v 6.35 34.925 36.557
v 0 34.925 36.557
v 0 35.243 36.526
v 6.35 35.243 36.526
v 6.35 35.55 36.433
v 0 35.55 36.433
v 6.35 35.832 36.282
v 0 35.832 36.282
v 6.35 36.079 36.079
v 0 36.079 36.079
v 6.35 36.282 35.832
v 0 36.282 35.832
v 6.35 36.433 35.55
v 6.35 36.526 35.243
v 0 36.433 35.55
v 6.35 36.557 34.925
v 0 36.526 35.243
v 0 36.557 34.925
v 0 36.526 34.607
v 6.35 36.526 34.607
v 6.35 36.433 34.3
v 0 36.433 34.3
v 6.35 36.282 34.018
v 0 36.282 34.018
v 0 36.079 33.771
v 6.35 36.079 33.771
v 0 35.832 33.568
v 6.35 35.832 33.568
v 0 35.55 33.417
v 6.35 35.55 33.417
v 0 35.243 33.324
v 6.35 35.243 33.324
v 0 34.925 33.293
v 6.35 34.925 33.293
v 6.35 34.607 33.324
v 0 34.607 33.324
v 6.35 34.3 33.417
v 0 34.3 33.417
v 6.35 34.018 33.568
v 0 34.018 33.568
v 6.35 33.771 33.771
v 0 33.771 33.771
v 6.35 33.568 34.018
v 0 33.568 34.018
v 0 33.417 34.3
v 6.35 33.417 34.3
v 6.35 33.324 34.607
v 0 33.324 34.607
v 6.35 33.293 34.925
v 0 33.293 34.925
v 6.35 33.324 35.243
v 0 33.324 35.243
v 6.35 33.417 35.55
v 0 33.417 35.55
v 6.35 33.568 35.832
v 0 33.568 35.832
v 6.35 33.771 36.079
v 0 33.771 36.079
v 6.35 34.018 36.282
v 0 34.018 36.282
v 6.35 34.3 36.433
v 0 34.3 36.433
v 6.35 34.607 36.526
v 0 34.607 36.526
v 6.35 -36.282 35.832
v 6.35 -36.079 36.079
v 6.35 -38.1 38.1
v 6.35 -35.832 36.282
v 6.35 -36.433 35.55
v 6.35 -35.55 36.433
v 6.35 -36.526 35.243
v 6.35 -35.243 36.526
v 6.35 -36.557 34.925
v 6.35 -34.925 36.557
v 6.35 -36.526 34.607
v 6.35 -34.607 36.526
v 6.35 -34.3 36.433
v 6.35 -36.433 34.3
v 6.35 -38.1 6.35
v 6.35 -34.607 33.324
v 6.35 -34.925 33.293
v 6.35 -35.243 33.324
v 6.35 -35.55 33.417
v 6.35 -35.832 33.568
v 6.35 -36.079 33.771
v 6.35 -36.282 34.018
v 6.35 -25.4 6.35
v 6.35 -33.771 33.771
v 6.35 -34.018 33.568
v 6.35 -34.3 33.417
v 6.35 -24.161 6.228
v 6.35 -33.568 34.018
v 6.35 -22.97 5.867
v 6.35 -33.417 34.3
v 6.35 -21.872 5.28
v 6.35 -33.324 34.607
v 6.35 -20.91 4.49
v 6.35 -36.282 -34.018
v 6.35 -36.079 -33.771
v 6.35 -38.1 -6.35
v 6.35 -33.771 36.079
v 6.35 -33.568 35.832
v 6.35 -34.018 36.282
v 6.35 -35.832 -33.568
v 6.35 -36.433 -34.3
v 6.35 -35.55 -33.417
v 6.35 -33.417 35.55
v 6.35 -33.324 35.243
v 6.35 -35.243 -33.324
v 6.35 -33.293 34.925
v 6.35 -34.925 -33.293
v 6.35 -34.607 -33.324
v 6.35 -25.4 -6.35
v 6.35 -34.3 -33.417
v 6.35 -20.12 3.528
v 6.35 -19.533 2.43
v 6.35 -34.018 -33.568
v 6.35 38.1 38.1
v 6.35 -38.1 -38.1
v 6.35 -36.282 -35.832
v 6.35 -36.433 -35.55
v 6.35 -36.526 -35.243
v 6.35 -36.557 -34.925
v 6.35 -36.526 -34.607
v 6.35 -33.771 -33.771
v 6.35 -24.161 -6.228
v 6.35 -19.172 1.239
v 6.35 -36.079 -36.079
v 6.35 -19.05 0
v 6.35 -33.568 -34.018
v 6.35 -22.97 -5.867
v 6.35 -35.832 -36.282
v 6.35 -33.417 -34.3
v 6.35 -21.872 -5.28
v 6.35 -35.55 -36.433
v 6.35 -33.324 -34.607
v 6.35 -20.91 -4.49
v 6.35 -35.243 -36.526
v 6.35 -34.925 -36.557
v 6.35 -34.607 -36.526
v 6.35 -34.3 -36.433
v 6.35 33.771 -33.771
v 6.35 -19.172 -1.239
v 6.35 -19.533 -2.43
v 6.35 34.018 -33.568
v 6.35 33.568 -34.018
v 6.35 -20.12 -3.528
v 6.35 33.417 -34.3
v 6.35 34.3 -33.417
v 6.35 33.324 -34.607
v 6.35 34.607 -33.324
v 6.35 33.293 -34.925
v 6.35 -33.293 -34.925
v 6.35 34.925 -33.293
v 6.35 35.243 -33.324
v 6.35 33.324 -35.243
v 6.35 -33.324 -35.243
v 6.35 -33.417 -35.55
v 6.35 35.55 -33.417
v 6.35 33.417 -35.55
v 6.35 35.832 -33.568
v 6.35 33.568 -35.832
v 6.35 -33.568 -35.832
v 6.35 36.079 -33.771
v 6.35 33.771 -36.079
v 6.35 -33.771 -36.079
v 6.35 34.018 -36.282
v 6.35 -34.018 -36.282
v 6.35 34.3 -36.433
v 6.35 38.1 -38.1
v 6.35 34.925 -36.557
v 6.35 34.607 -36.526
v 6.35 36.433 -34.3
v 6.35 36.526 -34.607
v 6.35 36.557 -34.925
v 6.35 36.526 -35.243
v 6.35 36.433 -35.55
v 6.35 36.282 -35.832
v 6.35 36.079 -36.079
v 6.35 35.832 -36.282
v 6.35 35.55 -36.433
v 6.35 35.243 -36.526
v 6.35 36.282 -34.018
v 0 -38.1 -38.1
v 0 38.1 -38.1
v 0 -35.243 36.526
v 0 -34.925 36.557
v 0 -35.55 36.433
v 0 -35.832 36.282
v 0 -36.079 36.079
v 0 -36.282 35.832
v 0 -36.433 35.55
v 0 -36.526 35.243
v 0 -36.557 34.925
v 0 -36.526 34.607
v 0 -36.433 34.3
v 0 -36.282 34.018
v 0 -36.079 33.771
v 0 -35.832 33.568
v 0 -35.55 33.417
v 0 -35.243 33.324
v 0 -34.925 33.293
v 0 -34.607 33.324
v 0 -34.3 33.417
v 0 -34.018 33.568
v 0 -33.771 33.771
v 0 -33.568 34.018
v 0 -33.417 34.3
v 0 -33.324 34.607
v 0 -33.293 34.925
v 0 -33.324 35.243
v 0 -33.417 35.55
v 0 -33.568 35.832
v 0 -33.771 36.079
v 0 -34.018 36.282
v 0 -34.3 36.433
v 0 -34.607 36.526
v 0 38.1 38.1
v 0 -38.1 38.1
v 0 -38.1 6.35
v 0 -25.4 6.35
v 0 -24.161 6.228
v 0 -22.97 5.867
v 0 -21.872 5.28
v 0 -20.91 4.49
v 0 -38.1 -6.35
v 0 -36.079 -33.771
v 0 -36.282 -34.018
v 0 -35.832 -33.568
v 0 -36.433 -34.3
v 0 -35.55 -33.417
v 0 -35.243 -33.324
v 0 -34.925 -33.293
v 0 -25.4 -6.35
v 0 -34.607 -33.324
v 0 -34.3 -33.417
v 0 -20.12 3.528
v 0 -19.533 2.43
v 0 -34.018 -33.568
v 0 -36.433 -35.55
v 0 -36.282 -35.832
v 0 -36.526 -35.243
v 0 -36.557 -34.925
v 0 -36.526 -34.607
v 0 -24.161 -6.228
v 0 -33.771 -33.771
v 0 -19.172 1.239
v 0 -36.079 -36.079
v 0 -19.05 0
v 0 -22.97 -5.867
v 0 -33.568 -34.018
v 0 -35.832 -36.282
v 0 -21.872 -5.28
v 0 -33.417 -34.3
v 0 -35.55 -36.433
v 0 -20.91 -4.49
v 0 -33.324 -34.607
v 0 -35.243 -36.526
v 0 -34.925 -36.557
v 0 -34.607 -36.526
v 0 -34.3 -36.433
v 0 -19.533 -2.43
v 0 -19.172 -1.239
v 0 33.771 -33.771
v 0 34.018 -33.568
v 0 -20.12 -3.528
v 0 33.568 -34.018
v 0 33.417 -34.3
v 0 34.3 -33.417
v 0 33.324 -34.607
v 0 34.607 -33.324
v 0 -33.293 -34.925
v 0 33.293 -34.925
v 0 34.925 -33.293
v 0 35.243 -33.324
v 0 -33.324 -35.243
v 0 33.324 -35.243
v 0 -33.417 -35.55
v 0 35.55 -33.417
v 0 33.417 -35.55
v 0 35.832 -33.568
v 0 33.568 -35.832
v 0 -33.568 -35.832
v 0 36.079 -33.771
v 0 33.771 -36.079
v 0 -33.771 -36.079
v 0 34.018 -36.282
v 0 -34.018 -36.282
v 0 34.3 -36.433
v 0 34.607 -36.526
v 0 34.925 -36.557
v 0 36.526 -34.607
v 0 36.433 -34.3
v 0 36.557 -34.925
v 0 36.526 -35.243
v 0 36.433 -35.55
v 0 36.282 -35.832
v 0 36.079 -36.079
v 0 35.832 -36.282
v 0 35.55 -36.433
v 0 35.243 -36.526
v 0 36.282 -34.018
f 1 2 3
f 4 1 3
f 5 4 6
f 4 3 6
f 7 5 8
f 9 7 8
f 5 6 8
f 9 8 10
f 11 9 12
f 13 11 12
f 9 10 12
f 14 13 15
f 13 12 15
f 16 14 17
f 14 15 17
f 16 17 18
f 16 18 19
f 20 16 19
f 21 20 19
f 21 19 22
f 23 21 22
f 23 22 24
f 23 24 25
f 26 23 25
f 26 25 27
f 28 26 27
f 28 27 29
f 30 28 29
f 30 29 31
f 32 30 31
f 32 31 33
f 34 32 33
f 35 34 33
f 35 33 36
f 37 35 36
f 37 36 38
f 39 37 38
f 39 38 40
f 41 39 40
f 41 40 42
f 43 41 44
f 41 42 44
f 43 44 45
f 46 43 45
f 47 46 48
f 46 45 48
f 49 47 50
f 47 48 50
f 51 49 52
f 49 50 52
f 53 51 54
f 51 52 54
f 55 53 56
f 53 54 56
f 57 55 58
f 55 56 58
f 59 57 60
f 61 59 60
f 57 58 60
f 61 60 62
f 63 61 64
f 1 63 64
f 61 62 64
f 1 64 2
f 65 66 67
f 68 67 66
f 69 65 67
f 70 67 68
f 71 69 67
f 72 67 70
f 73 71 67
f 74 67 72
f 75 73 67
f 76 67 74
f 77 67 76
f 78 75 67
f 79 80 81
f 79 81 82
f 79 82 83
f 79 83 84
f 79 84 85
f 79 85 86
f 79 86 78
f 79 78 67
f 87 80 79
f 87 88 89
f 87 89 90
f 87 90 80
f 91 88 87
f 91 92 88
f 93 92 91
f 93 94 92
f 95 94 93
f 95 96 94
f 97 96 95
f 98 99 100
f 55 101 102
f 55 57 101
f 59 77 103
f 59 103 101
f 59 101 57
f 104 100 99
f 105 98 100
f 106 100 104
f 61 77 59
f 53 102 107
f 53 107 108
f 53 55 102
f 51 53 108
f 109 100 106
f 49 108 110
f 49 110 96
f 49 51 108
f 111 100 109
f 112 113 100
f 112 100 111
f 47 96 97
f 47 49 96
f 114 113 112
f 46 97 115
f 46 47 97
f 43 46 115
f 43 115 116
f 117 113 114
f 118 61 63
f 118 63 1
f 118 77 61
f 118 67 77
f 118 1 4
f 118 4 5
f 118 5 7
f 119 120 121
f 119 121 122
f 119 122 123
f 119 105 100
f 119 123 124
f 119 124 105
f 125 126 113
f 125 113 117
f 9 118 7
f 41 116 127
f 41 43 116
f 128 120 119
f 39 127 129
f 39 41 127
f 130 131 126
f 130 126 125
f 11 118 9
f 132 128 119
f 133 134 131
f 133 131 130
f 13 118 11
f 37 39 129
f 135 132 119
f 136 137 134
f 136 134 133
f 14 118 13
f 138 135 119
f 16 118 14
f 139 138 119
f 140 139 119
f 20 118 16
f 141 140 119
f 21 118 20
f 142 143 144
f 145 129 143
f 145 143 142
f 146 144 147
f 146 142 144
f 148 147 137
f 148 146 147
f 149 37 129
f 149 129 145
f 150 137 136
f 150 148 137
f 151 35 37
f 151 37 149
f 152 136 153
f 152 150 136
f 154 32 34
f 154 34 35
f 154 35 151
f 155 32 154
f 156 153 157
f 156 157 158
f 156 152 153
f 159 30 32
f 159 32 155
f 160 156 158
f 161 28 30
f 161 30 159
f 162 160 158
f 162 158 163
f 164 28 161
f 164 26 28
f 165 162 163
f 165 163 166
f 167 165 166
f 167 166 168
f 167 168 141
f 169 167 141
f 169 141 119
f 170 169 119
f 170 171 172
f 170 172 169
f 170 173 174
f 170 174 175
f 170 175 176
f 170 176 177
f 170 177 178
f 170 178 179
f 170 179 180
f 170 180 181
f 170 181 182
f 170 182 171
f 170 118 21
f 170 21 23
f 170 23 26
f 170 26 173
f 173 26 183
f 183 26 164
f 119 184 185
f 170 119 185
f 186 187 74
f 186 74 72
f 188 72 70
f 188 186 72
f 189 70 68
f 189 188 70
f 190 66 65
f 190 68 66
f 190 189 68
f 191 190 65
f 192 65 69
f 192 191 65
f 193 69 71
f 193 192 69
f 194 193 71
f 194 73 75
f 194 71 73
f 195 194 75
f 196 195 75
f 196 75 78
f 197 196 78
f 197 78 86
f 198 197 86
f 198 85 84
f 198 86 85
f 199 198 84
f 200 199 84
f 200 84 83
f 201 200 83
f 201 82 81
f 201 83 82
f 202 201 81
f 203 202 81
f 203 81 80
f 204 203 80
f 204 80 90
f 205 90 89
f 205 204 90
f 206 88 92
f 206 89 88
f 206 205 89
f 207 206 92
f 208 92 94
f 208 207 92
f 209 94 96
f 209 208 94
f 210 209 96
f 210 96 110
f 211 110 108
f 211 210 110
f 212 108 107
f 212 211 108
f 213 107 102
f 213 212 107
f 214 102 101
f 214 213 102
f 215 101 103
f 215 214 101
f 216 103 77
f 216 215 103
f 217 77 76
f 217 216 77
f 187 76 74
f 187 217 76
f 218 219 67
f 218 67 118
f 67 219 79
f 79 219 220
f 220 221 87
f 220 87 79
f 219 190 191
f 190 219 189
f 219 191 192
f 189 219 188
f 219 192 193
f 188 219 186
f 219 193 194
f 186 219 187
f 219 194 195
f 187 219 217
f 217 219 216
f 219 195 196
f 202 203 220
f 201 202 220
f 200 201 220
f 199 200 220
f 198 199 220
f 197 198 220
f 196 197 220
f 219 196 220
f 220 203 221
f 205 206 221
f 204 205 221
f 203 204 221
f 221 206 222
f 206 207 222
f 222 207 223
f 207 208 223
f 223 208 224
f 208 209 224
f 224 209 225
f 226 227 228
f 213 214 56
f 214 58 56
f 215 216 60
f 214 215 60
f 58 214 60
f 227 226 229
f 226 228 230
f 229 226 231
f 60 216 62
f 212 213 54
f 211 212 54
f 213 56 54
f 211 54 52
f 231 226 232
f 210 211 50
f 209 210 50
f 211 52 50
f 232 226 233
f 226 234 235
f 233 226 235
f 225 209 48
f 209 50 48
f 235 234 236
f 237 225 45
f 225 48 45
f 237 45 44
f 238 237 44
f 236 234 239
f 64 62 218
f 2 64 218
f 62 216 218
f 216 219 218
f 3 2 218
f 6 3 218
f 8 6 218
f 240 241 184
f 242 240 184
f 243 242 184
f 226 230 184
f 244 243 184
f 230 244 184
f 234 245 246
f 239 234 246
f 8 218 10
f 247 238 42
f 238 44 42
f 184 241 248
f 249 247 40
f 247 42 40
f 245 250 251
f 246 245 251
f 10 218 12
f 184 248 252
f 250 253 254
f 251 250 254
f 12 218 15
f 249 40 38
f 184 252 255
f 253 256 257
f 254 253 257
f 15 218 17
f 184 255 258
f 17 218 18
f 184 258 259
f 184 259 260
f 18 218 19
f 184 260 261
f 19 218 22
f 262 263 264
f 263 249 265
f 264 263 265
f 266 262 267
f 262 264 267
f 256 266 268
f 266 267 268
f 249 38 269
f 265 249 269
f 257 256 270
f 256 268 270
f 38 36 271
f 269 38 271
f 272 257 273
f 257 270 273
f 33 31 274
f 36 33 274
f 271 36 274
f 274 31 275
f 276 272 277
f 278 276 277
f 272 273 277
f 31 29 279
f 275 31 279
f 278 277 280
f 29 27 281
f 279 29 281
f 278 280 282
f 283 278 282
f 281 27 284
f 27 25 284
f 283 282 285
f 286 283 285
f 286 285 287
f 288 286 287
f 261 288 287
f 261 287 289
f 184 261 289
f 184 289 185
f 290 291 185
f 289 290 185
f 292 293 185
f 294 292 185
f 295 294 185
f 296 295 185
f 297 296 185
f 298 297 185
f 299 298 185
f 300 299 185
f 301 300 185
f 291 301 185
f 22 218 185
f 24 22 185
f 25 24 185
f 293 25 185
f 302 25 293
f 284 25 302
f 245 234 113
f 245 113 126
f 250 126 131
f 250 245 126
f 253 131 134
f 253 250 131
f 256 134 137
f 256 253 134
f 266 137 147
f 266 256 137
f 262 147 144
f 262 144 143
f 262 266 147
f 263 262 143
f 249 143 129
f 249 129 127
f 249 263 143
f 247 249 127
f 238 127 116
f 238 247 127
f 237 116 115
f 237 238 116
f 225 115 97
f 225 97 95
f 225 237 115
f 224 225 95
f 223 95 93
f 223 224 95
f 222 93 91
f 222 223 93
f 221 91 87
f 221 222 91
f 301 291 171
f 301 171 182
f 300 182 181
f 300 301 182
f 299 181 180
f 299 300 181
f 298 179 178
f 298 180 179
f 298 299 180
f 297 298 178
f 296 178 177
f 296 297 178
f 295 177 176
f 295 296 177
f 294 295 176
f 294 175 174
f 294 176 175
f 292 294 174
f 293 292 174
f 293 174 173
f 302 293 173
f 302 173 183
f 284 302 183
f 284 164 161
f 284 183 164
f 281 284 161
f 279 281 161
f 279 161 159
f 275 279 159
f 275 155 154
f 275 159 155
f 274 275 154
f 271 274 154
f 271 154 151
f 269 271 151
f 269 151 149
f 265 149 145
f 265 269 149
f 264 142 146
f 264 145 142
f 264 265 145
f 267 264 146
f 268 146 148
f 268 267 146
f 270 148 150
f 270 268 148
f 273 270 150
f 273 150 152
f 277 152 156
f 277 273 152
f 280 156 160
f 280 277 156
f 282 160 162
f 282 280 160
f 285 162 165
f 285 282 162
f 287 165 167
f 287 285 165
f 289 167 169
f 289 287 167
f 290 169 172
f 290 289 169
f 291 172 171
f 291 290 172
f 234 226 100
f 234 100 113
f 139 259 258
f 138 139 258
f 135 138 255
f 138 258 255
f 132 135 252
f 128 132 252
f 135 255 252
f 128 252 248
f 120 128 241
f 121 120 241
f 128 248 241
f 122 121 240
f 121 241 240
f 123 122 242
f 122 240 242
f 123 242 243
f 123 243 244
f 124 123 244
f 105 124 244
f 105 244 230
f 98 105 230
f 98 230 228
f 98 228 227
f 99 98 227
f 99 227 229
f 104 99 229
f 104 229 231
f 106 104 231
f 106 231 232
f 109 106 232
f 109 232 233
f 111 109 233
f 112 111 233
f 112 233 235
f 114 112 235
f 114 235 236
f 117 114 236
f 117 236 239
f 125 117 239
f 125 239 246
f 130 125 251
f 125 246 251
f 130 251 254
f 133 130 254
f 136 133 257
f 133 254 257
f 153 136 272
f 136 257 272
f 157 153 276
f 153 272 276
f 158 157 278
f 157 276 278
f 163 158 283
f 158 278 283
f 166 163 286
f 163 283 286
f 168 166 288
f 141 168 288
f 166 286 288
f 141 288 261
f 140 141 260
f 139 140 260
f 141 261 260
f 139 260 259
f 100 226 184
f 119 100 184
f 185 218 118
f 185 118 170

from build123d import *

# Parameters (mm, degrees)
SKETCH1_W                      = 76.2
SKETCH1_H                      = 76.2
BOSS_EXTRUDE1_DEPTH            = 6.35
F_4_CLEARANCE_HOLE1_D          = 3.2639
MIRROR2_COPY_1_D               = 3.2639
F_1_2_0_5_DIAMETER_SLOT1_DEPTH = 6.35


# Read off the part's stored shape, not the designer's step: 1/2 (0.5) Diameter Slot1
with BuildPart() as part:
    # Sketch1 → Boss-Extrude1 (new body)
    with BuildSketch(Plane(origin=(0, 0, 0), x_dir=(0, 0, -1), z_dir=(1, 0, 0))):
        Rectangle(SKETCH1_W, SKETCH1_H)
    extrude(amount=BOSS_EXTRUDE1_DEPTH)

    # #4 Clearance Hole1 (through all)
    with Locations(Plane(origin=(6.35, 0, 0), x_dir=(0, 0, -1), z_dir=(1, 0, 0))):
        with Locations((-34.925, 34.925)):
            f_4_clearance_hole1 = Hole(F_4_CLEARANCE_HOLE1_D / 2)

    # Mirror1: #4 Clearance Hole1 across plane
    add(f_4_clearance_hole1.mirror(Plane.XY), mode=Mode.SUBTRACT)

    # Mirror2: #4 Clearance Hole1 across plane
    add(f_4_clearance_hole1.mirror(Plane.ZX), mode=Mode.SUBTRACT)

    # Mirror2 copy 1 (through all)
    with Locations(Plane(origin=(6.35, 0, 0), x_dir=(0, 0, 1), z_dir=(1, 0, 0))):
        with Locations((-34.925, 34.925)):
            Hole(MIRROR2_COPY_1_D / 2)

    # 1/2 (0.5) Diameter Slot1 outline → 1/2 (0.5) Diameter Slot1 (cut)
    with BuildSketch(Plane.YZ):
        with BuildLine():
            ThreePointArc((-25.4, -6.35), (-19.05, 0), (-25.4, 6.35))
            Line((-25.4, 6.35), (-38.1, 6.35))
            Line((-38.1, 6.35), (-38.1, -6.35))
            Line((-38.1, -6.35), (-25.4, -6.35))
        make_face()
    extrude(amount=F_1_2_0_5_DIAMETER_SLOT1_DEPTH, mode=Mode.SUBTRACT)


solid = part.part
